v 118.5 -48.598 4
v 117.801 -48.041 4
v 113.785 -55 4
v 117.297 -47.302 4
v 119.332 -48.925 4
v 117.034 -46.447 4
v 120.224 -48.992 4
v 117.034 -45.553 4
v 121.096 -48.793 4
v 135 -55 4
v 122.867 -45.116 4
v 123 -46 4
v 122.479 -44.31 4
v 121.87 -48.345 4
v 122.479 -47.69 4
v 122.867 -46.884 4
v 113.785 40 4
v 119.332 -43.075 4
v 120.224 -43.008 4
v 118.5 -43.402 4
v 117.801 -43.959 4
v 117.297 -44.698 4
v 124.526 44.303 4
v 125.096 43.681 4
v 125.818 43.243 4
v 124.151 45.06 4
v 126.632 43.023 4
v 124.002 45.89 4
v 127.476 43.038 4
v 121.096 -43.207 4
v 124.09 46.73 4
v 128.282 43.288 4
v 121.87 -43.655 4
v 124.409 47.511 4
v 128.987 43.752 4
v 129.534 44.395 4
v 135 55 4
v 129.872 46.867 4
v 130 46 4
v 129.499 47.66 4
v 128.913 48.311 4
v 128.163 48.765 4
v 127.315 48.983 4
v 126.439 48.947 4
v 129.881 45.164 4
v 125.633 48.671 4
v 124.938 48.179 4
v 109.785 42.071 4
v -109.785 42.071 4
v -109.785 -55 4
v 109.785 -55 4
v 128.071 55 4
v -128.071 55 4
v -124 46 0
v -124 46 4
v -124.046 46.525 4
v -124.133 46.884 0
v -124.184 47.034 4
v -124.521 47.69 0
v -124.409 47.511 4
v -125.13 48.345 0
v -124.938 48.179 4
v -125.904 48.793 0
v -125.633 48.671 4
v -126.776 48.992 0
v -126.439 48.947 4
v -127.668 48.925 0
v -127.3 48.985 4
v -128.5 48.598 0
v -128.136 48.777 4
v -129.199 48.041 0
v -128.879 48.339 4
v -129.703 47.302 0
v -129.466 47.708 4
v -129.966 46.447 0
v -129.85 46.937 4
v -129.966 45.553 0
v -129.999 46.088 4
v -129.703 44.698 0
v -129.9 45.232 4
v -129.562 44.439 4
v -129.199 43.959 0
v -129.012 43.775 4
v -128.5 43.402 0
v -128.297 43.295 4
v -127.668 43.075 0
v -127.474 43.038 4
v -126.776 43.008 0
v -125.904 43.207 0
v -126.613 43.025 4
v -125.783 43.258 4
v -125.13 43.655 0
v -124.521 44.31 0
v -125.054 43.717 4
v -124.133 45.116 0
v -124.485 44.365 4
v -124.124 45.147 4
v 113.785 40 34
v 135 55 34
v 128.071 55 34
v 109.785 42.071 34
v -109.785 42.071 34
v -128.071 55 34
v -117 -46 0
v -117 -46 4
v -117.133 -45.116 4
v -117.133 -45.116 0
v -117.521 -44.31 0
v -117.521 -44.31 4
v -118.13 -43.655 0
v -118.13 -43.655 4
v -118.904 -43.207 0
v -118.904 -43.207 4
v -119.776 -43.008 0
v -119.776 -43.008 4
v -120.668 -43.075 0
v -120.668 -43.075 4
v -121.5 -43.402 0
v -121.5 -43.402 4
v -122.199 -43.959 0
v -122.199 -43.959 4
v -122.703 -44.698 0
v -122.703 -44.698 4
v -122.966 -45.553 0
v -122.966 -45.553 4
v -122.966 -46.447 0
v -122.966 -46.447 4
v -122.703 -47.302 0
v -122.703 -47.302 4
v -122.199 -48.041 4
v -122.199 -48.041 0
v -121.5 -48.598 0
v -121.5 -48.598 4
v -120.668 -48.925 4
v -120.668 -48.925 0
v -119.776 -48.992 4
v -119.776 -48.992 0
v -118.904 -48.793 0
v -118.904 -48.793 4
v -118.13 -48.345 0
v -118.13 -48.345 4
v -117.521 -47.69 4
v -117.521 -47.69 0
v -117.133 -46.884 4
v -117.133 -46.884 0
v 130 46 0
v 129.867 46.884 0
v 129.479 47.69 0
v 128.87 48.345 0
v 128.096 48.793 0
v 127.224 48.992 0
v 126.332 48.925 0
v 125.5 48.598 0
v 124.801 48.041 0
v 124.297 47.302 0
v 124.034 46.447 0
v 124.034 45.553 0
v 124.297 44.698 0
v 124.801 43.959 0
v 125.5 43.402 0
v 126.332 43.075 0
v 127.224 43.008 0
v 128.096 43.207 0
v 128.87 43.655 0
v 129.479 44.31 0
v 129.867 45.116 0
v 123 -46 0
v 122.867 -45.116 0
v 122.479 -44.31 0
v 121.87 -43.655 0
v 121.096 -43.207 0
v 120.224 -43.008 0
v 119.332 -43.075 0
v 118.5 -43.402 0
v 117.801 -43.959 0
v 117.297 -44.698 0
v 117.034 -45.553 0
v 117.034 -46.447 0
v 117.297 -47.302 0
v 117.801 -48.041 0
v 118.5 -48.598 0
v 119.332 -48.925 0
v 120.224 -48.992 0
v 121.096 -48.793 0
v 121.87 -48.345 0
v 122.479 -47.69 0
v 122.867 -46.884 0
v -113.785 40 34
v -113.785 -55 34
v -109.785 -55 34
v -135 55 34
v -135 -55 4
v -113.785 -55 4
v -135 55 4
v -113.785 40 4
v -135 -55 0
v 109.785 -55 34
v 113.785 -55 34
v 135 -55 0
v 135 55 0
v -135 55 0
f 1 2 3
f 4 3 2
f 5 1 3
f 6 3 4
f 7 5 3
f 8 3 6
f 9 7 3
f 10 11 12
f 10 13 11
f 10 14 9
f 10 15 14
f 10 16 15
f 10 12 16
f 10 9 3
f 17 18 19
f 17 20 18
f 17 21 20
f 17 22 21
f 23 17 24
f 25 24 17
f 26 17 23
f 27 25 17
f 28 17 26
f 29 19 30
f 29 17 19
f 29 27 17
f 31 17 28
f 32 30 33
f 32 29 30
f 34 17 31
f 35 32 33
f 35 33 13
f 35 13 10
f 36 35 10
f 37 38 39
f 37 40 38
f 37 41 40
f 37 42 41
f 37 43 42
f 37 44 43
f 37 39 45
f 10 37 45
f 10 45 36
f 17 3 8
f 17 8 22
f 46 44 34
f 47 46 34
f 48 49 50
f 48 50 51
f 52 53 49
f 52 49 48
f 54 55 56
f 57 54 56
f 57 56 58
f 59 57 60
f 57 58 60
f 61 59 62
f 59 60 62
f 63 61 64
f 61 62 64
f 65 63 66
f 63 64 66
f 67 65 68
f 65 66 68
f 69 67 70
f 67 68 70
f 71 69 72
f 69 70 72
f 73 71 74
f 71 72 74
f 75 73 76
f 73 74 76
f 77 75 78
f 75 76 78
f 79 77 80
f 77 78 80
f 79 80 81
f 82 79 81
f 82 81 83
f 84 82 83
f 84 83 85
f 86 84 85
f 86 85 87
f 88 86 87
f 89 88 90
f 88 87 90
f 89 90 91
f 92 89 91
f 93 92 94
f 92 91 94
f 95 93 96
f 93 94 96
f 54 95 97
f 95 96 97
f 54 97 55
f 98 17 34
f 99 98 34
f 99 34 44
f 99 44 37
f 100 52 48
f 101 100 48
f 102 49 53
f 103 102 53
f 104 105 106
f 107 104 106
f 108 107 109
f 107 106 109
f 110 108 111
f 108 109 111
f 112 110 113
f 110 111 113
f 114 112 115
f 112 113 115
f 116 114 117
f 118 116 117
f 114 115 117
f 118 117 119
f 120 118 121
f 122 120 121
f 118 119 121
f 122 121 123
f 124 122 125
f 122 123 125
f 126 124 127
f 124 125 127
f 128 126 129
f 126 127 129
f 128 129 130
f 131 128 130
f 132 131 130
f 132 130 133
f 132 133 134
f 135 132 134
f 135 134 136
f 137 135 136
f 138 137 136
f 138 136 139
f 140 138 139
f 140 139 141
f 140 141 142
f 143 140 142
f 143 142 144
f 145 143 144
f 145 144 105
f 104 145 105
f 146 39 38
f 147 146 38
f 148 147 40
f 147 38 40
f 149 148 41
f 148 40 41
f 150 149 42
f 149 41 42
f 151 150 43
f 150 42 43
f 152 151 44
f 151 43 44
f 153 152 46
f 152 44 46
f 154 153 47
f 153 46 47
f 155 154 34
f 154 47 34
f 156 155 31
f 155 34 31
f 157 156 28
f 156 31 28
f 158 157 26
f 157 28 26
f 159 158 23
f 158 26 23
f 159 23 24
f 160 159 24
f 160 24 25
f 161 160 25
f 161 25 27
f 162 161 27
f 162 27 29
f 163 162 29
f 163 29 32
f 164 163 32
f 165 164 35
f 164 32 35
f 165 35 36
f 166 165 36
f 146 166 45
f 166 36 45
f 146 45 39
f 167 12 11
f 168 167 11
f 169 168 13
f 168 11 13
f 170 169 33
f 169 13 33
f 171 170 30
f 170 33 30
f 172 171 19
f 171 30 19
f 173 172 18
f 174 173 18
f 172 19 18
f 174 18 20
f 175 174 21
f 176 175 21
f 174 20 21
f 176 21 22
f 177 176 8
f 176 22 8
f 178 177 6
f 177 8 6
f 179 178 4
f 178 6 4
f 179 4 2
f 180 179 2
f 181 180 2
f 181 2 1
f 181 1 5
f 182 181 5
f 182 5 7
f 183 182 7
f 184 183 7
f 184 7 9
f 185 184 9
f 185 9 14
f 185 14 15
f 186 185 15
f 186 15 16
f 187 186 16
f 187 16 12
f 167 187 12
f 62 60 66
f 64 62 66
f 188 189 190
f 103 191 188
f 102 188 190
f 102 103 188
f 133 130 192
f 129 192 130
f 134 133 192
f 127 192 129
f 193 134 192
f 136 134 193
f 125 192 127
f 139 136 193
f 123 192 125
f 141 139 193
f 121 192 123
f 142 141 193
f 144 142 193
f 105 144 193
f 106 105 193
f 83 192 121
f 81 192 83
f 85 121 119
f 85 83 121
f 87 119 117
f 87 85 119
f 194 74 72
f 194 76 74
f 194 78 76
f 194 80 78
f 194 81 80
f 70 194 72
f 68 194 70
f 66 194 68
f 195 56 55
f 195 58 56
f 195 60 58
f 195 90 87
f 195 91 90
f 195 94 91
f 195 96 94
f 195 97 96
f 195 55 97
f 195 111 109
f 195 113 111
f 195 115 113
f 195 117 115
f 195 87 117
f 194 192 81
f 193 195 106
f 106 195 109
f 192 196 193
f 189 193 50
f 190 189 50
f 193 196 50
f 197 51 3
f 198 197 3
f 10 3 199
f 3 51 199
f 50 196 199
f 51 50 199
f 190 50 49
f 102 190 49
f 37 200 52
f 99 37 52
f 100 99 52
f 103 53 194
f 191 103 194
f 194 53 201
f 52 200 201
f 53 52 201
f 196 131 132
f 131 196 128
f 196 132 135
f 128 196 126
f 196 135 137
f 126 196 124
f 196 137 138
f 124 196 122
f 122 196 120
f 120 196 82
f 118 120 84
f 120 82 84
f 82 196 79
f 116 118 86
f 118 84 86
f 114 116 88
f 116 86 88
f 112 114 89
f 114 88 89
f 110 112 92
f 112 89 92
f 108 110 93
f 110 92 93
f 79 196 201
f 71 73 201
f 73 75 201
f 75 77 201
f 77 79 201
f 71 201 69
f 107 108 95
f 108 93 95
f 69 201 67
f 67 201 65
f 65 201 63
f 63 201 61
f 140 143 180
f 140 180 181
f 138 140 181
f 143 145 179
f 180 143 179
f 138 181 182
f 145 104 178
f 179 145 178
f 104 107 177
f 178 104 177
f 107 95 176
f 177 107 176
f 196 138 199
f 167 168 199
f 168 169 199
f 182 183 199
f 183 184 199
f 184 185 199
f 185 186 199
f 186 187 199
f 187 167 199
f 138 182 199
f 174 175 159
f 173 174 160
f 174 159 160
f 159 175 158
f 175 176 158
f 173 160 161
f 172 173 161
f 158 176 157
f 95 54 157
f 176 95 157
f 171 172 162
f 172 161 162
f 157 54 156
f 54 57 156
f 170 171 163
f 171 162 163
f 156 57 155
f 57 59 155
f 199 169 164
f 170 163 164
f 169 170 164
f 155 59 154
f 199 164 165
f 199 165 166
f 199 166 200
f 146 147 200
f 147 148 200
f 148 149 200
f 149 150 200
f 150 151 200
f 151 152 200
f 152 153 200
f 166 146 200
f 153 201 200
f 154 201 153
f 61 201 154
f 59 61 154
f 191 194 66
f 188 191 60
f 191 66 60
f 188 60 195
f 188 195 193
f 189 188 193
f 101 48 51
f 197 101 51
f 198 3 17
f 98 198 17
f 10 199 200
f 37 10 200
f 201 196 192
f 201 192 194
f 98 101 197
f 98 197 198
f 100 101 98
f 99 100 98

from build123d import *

# Parameters (mm, degrees)
SKETCH1_W           = 270
SKETCH1_H           = 110
BOSS_EXTRUDE1_DEPTH = 4
BOSS_EXTRUDE2_DEPTH = 30
SKETCH3_R           = 3
CUT_EXTRUDE1_DEPTH  = 30


with BuildPart() as part:
    # Sketch1 → Boss-Extrude1 (new body)
    with BuildSketch(Plane.XY):
        Rectangle(SKETCH1_W, SKETCH1_H)
    extrude(amount=BOSS_EXTRUDE1_DEPTH)

    # Sketch2 → Boss-Extrude2 (add)
    with BuildSketch(Plane.XY.offset(4)):
        Polygon((-128.071344503, 55), (-135, 55), (-113.784719429, 40), (-113.784719429, -55), (-109.784719429, -55), (-109.784719429, 42.070669408), align=None)
        Polygon((128.071344503, 55), (109.784719429, 42.070669408), (109.784719429, -55), (113.784719429, -55), (113.784719429, 40), (135, 55), align=None)
    extrude(amount=BOSS_EXTRUDE2_DEPTH)

    # Sketch3 → Cut-Extrude1 (cut)
    with BuildSketch(Plane.XY.offset(4)):
        with Locations((-120, -46)):
            Circle(SKETCH3_R)
        with Locations((120, -46)):
            Circle(SKETCH3_R)
        with Locations((127, 46)):
            Circle(SKETCH3_R)
        with Locations((-127, 46)):
            Circle(SKETCH3_R)
    extrude(amount=-CUT_EXTRUDE1_DEPTH, mode=Mode.SUBTRACT)


solid = part.part
